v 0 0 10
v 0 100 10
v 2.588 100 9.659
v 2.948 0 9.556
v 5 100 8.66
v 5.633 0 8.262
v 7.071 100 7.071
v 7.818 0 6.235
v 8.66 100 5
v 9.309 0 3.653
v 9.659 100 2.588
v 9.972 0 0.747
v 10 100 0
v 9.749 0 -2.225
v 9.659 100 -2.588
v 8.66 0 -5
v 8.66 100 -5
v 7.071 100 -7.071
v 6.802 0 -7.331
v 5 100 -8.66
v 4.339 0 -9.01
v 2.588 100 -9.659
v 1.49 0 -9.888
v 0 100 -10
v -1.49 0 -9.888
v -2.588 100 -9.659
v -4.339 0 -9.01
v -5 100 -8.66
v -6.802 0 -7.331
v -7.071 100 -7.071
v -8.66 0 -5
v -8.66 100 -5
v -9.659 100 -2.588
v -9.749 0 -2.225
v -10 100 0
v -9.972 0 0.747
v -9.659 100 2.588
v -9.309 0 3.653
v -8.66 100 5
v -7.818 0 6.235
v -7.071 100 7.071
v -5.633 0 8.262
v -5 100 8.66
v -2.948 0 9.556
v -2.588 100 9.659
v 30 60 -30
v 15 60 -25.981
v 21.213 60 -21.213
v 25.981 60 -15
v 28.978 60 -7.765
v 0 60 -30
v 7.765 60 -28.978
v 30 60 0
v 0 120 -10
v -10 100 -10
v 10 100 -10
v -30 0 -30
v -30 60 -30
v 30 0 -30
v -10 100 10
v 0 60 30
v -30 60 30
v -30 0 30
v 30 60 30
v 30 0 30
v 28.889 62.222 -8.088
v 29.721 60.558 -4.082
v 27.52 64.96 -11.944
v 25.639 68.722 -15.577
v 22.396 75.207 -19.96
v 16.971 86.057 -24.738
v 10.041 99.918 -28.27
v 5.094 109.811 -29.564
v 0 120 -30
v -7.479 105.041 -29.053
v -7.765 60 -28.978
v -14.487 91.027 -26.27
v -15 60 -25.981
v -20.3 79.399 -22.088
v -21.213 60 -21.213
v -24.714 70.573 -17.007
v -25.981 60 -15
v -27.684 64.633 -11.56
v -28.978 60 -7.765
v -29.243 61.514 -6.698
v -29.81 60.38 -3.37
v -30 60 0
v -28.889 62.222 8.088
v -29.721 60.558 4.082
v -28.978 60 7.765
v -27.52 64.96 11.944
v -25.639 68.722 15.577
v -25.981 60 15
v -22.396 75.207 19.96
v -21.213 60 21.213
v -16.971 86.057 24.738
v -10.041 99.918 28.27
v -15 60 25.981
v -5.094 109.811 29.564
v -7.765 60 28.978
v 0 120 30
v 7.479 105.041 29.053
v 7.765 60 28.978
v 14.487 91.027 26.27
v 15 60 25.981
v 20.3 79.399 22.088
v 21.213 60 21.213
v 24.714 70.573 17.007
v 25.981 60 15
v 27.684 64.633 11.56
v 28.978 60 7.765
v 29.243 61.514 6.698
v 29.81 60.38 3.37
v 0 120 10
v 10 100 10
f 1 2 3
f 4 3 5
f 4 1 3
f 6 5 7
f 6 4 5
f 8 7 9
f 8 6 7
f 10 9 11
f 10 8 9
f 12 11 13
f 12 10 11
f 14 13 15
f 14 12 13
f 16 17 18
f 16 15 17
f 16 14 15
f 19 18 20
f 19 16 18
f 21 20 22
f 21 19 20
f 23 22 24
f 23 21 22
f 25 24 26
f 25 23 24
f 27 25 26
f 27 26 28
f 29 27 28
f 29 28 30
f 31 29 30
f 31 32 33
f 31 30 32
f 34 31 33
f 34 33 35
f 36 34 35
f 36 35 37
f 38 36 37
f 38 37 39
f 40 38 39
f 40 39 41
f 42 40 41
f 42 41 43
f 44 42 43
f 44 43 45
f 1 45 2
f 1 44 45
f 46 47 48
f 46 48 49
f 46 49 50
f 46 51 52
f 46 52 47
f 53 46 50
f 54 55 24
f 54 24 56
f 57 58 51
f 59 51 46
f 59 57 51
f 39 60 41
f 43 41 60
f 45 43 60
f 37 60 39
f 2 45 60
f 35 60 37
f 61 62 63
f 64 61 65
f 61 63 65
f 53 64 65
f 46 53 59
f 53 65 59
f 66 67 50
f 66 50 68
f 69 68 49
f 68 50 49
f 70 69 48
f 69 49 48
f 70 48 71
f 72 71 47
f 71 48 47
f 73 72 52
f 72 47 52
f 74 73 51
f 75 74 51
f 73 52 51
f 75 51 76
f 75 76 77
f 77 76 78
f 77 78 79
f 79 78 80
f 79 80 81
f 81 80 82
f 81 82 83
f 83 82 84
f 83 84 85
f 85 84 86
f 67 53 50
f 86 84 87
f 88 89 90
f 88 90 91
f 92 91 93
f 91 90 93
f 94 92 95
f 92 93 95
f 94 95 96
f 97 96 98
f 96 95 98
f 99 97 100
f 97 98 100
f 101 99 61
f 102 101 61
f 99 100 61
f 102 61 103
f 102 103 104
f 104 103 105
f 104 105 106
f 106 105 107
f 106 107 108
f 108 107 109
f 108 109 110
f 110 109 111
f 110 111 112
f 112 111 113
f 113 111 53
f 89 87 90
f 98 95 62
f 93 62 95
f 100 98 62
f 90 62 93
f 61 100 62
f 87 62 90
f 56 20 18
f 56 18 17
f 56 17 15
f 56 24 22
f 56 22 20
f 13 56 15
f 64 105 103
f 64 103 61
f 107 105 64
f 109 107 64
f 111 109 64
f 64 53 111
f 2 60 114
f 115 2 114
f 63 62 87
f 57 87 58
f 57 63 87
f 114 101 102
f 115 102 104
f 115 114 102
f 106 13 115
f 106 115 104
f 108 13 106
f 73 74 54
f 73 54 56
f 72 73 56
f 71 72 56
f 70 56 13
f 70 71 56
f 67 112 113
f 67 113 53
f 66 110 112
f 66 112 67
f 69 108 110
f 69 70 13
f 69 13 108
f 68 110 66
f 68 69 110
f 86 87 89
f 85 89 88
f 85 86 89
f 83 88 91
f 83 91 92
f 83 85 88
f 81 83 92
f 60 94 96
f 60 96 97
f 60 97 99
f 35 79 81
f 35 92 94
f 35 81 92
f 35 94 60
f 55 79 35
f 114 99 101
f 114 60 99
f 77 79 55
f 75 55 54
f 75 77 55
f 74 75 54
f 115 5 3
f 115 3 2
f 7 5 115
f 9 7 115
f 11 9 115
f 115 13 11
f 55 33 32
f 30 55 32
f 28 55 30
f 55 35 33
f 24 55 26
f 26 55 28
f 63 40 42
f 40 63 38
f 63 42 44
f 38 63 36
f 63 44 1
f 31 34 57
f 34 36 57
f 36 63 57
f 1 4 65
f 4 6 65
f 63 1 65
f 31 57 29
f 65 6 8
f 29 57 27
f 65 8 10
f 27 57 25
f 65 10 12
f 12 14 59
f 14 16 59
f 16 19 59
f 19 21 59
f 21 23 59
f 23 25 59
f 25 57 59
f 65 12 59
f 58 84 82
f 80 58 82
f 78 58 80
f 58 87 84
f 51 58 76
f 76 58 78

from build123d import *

# Parameters (mm, degrees)
SKETCH1_W               = 60
SKETCH1_H               = 60
BOSS_EXTRUDE1_DEPTH     = 60
SKETCH1_3_R             = 30
BOSS_EXTRUDE2_DEPTH     = 120
CUT_EXTRUDE1_START      = 120
SKETCH1_4_W             = 20
SKETCH1_4_H             = 20
CUT_EXTRUDE1_DEPTH      = 20
SKETCH1_5_R             = 10
CUT_EXTRUDE2_DEPTH      = 128.279220614
CUT_EXTRUDE3_DEPTH      = 138.477270849
CUT_EXTRUDE3_DEPTH_BACK = 138.477270849


with BuildPart() as part:
    # Sketch1 → Boss-Extrude1 (new body)
    with BuildSketch(Plane(origin=(0, 0, 0), x_dir=(1, 0, 0), z_dir=(0, 1, 0))):
        Rectangle(SKETCH1_W, SKETCH1_H)
    extrude(amount=BOSS_EXTRUDE1_DEPTH)

    # Sketch1<3> → Boss-Extrude2 (add)
    with BuildSketch(Plane(origin=(0, 0, 0), x_dir=(1, 0, 0), z_dir=(0, 1, 0))):
        with Locations(Location((0, 0, 0), (0, 0, 270))):
            Circle(SKETCH1_3_R)
    extrude(amount=BOSS_EXTRUDE2_DEPTH)

    # Sketch1<4> → Cut-Extrude1 (cut)
    with BuildSketch(Plane(origin=(0, 0, 0), x_dir=(1, 0, 0), z_dir=(0, 1, 0)).offset(CUT_EXTRUDE1_START)):
        Rectangle(SKETCH1_4_W, SKETCH1_4_H)
    extrude(amount=-CUT_EXTRUDE1_DEPTH, mode=Mode.SUBTRACT)

    # Sketch1<5> → Cut-Extrude2 (cut, through all)
    with BuildSketch(Plane(origin=(0, 0, 0), x_dir=(1, 0, 0), z_dir=(0, 1, 0))):
        with Locations(Location((0, 0, 0), (0, 0, 270))):
            Circle(SKETCH1_5_R)
    extrude(amount=CUT_EXTRUDE2_DEPTH, mode=Mode.SUBTRACT)

    # Sketch2 → Cut-Extrude3 (cut, two sides: drawn at the far end of the back side and taken through both)
    with BuildSketch(Plane.XY.offset(30).offset(-CUT_EXTRUDE3_DEPTH_BACK)):
        Polygon((-110.366799799, -100.733599598), (-30, 60), (0, 120), (30, 60), (110.366799799, -100.733599598), (110.366799799, 258.677655371), (-110.366799799, 258.677655371), align=None)
    extrude(amount=CUT_EXTRUDE3_DEPTH + CUT_EXTRUDE3_DEPTH_BACK, mode=Mode.SUBTRACT)


solid = part.part
